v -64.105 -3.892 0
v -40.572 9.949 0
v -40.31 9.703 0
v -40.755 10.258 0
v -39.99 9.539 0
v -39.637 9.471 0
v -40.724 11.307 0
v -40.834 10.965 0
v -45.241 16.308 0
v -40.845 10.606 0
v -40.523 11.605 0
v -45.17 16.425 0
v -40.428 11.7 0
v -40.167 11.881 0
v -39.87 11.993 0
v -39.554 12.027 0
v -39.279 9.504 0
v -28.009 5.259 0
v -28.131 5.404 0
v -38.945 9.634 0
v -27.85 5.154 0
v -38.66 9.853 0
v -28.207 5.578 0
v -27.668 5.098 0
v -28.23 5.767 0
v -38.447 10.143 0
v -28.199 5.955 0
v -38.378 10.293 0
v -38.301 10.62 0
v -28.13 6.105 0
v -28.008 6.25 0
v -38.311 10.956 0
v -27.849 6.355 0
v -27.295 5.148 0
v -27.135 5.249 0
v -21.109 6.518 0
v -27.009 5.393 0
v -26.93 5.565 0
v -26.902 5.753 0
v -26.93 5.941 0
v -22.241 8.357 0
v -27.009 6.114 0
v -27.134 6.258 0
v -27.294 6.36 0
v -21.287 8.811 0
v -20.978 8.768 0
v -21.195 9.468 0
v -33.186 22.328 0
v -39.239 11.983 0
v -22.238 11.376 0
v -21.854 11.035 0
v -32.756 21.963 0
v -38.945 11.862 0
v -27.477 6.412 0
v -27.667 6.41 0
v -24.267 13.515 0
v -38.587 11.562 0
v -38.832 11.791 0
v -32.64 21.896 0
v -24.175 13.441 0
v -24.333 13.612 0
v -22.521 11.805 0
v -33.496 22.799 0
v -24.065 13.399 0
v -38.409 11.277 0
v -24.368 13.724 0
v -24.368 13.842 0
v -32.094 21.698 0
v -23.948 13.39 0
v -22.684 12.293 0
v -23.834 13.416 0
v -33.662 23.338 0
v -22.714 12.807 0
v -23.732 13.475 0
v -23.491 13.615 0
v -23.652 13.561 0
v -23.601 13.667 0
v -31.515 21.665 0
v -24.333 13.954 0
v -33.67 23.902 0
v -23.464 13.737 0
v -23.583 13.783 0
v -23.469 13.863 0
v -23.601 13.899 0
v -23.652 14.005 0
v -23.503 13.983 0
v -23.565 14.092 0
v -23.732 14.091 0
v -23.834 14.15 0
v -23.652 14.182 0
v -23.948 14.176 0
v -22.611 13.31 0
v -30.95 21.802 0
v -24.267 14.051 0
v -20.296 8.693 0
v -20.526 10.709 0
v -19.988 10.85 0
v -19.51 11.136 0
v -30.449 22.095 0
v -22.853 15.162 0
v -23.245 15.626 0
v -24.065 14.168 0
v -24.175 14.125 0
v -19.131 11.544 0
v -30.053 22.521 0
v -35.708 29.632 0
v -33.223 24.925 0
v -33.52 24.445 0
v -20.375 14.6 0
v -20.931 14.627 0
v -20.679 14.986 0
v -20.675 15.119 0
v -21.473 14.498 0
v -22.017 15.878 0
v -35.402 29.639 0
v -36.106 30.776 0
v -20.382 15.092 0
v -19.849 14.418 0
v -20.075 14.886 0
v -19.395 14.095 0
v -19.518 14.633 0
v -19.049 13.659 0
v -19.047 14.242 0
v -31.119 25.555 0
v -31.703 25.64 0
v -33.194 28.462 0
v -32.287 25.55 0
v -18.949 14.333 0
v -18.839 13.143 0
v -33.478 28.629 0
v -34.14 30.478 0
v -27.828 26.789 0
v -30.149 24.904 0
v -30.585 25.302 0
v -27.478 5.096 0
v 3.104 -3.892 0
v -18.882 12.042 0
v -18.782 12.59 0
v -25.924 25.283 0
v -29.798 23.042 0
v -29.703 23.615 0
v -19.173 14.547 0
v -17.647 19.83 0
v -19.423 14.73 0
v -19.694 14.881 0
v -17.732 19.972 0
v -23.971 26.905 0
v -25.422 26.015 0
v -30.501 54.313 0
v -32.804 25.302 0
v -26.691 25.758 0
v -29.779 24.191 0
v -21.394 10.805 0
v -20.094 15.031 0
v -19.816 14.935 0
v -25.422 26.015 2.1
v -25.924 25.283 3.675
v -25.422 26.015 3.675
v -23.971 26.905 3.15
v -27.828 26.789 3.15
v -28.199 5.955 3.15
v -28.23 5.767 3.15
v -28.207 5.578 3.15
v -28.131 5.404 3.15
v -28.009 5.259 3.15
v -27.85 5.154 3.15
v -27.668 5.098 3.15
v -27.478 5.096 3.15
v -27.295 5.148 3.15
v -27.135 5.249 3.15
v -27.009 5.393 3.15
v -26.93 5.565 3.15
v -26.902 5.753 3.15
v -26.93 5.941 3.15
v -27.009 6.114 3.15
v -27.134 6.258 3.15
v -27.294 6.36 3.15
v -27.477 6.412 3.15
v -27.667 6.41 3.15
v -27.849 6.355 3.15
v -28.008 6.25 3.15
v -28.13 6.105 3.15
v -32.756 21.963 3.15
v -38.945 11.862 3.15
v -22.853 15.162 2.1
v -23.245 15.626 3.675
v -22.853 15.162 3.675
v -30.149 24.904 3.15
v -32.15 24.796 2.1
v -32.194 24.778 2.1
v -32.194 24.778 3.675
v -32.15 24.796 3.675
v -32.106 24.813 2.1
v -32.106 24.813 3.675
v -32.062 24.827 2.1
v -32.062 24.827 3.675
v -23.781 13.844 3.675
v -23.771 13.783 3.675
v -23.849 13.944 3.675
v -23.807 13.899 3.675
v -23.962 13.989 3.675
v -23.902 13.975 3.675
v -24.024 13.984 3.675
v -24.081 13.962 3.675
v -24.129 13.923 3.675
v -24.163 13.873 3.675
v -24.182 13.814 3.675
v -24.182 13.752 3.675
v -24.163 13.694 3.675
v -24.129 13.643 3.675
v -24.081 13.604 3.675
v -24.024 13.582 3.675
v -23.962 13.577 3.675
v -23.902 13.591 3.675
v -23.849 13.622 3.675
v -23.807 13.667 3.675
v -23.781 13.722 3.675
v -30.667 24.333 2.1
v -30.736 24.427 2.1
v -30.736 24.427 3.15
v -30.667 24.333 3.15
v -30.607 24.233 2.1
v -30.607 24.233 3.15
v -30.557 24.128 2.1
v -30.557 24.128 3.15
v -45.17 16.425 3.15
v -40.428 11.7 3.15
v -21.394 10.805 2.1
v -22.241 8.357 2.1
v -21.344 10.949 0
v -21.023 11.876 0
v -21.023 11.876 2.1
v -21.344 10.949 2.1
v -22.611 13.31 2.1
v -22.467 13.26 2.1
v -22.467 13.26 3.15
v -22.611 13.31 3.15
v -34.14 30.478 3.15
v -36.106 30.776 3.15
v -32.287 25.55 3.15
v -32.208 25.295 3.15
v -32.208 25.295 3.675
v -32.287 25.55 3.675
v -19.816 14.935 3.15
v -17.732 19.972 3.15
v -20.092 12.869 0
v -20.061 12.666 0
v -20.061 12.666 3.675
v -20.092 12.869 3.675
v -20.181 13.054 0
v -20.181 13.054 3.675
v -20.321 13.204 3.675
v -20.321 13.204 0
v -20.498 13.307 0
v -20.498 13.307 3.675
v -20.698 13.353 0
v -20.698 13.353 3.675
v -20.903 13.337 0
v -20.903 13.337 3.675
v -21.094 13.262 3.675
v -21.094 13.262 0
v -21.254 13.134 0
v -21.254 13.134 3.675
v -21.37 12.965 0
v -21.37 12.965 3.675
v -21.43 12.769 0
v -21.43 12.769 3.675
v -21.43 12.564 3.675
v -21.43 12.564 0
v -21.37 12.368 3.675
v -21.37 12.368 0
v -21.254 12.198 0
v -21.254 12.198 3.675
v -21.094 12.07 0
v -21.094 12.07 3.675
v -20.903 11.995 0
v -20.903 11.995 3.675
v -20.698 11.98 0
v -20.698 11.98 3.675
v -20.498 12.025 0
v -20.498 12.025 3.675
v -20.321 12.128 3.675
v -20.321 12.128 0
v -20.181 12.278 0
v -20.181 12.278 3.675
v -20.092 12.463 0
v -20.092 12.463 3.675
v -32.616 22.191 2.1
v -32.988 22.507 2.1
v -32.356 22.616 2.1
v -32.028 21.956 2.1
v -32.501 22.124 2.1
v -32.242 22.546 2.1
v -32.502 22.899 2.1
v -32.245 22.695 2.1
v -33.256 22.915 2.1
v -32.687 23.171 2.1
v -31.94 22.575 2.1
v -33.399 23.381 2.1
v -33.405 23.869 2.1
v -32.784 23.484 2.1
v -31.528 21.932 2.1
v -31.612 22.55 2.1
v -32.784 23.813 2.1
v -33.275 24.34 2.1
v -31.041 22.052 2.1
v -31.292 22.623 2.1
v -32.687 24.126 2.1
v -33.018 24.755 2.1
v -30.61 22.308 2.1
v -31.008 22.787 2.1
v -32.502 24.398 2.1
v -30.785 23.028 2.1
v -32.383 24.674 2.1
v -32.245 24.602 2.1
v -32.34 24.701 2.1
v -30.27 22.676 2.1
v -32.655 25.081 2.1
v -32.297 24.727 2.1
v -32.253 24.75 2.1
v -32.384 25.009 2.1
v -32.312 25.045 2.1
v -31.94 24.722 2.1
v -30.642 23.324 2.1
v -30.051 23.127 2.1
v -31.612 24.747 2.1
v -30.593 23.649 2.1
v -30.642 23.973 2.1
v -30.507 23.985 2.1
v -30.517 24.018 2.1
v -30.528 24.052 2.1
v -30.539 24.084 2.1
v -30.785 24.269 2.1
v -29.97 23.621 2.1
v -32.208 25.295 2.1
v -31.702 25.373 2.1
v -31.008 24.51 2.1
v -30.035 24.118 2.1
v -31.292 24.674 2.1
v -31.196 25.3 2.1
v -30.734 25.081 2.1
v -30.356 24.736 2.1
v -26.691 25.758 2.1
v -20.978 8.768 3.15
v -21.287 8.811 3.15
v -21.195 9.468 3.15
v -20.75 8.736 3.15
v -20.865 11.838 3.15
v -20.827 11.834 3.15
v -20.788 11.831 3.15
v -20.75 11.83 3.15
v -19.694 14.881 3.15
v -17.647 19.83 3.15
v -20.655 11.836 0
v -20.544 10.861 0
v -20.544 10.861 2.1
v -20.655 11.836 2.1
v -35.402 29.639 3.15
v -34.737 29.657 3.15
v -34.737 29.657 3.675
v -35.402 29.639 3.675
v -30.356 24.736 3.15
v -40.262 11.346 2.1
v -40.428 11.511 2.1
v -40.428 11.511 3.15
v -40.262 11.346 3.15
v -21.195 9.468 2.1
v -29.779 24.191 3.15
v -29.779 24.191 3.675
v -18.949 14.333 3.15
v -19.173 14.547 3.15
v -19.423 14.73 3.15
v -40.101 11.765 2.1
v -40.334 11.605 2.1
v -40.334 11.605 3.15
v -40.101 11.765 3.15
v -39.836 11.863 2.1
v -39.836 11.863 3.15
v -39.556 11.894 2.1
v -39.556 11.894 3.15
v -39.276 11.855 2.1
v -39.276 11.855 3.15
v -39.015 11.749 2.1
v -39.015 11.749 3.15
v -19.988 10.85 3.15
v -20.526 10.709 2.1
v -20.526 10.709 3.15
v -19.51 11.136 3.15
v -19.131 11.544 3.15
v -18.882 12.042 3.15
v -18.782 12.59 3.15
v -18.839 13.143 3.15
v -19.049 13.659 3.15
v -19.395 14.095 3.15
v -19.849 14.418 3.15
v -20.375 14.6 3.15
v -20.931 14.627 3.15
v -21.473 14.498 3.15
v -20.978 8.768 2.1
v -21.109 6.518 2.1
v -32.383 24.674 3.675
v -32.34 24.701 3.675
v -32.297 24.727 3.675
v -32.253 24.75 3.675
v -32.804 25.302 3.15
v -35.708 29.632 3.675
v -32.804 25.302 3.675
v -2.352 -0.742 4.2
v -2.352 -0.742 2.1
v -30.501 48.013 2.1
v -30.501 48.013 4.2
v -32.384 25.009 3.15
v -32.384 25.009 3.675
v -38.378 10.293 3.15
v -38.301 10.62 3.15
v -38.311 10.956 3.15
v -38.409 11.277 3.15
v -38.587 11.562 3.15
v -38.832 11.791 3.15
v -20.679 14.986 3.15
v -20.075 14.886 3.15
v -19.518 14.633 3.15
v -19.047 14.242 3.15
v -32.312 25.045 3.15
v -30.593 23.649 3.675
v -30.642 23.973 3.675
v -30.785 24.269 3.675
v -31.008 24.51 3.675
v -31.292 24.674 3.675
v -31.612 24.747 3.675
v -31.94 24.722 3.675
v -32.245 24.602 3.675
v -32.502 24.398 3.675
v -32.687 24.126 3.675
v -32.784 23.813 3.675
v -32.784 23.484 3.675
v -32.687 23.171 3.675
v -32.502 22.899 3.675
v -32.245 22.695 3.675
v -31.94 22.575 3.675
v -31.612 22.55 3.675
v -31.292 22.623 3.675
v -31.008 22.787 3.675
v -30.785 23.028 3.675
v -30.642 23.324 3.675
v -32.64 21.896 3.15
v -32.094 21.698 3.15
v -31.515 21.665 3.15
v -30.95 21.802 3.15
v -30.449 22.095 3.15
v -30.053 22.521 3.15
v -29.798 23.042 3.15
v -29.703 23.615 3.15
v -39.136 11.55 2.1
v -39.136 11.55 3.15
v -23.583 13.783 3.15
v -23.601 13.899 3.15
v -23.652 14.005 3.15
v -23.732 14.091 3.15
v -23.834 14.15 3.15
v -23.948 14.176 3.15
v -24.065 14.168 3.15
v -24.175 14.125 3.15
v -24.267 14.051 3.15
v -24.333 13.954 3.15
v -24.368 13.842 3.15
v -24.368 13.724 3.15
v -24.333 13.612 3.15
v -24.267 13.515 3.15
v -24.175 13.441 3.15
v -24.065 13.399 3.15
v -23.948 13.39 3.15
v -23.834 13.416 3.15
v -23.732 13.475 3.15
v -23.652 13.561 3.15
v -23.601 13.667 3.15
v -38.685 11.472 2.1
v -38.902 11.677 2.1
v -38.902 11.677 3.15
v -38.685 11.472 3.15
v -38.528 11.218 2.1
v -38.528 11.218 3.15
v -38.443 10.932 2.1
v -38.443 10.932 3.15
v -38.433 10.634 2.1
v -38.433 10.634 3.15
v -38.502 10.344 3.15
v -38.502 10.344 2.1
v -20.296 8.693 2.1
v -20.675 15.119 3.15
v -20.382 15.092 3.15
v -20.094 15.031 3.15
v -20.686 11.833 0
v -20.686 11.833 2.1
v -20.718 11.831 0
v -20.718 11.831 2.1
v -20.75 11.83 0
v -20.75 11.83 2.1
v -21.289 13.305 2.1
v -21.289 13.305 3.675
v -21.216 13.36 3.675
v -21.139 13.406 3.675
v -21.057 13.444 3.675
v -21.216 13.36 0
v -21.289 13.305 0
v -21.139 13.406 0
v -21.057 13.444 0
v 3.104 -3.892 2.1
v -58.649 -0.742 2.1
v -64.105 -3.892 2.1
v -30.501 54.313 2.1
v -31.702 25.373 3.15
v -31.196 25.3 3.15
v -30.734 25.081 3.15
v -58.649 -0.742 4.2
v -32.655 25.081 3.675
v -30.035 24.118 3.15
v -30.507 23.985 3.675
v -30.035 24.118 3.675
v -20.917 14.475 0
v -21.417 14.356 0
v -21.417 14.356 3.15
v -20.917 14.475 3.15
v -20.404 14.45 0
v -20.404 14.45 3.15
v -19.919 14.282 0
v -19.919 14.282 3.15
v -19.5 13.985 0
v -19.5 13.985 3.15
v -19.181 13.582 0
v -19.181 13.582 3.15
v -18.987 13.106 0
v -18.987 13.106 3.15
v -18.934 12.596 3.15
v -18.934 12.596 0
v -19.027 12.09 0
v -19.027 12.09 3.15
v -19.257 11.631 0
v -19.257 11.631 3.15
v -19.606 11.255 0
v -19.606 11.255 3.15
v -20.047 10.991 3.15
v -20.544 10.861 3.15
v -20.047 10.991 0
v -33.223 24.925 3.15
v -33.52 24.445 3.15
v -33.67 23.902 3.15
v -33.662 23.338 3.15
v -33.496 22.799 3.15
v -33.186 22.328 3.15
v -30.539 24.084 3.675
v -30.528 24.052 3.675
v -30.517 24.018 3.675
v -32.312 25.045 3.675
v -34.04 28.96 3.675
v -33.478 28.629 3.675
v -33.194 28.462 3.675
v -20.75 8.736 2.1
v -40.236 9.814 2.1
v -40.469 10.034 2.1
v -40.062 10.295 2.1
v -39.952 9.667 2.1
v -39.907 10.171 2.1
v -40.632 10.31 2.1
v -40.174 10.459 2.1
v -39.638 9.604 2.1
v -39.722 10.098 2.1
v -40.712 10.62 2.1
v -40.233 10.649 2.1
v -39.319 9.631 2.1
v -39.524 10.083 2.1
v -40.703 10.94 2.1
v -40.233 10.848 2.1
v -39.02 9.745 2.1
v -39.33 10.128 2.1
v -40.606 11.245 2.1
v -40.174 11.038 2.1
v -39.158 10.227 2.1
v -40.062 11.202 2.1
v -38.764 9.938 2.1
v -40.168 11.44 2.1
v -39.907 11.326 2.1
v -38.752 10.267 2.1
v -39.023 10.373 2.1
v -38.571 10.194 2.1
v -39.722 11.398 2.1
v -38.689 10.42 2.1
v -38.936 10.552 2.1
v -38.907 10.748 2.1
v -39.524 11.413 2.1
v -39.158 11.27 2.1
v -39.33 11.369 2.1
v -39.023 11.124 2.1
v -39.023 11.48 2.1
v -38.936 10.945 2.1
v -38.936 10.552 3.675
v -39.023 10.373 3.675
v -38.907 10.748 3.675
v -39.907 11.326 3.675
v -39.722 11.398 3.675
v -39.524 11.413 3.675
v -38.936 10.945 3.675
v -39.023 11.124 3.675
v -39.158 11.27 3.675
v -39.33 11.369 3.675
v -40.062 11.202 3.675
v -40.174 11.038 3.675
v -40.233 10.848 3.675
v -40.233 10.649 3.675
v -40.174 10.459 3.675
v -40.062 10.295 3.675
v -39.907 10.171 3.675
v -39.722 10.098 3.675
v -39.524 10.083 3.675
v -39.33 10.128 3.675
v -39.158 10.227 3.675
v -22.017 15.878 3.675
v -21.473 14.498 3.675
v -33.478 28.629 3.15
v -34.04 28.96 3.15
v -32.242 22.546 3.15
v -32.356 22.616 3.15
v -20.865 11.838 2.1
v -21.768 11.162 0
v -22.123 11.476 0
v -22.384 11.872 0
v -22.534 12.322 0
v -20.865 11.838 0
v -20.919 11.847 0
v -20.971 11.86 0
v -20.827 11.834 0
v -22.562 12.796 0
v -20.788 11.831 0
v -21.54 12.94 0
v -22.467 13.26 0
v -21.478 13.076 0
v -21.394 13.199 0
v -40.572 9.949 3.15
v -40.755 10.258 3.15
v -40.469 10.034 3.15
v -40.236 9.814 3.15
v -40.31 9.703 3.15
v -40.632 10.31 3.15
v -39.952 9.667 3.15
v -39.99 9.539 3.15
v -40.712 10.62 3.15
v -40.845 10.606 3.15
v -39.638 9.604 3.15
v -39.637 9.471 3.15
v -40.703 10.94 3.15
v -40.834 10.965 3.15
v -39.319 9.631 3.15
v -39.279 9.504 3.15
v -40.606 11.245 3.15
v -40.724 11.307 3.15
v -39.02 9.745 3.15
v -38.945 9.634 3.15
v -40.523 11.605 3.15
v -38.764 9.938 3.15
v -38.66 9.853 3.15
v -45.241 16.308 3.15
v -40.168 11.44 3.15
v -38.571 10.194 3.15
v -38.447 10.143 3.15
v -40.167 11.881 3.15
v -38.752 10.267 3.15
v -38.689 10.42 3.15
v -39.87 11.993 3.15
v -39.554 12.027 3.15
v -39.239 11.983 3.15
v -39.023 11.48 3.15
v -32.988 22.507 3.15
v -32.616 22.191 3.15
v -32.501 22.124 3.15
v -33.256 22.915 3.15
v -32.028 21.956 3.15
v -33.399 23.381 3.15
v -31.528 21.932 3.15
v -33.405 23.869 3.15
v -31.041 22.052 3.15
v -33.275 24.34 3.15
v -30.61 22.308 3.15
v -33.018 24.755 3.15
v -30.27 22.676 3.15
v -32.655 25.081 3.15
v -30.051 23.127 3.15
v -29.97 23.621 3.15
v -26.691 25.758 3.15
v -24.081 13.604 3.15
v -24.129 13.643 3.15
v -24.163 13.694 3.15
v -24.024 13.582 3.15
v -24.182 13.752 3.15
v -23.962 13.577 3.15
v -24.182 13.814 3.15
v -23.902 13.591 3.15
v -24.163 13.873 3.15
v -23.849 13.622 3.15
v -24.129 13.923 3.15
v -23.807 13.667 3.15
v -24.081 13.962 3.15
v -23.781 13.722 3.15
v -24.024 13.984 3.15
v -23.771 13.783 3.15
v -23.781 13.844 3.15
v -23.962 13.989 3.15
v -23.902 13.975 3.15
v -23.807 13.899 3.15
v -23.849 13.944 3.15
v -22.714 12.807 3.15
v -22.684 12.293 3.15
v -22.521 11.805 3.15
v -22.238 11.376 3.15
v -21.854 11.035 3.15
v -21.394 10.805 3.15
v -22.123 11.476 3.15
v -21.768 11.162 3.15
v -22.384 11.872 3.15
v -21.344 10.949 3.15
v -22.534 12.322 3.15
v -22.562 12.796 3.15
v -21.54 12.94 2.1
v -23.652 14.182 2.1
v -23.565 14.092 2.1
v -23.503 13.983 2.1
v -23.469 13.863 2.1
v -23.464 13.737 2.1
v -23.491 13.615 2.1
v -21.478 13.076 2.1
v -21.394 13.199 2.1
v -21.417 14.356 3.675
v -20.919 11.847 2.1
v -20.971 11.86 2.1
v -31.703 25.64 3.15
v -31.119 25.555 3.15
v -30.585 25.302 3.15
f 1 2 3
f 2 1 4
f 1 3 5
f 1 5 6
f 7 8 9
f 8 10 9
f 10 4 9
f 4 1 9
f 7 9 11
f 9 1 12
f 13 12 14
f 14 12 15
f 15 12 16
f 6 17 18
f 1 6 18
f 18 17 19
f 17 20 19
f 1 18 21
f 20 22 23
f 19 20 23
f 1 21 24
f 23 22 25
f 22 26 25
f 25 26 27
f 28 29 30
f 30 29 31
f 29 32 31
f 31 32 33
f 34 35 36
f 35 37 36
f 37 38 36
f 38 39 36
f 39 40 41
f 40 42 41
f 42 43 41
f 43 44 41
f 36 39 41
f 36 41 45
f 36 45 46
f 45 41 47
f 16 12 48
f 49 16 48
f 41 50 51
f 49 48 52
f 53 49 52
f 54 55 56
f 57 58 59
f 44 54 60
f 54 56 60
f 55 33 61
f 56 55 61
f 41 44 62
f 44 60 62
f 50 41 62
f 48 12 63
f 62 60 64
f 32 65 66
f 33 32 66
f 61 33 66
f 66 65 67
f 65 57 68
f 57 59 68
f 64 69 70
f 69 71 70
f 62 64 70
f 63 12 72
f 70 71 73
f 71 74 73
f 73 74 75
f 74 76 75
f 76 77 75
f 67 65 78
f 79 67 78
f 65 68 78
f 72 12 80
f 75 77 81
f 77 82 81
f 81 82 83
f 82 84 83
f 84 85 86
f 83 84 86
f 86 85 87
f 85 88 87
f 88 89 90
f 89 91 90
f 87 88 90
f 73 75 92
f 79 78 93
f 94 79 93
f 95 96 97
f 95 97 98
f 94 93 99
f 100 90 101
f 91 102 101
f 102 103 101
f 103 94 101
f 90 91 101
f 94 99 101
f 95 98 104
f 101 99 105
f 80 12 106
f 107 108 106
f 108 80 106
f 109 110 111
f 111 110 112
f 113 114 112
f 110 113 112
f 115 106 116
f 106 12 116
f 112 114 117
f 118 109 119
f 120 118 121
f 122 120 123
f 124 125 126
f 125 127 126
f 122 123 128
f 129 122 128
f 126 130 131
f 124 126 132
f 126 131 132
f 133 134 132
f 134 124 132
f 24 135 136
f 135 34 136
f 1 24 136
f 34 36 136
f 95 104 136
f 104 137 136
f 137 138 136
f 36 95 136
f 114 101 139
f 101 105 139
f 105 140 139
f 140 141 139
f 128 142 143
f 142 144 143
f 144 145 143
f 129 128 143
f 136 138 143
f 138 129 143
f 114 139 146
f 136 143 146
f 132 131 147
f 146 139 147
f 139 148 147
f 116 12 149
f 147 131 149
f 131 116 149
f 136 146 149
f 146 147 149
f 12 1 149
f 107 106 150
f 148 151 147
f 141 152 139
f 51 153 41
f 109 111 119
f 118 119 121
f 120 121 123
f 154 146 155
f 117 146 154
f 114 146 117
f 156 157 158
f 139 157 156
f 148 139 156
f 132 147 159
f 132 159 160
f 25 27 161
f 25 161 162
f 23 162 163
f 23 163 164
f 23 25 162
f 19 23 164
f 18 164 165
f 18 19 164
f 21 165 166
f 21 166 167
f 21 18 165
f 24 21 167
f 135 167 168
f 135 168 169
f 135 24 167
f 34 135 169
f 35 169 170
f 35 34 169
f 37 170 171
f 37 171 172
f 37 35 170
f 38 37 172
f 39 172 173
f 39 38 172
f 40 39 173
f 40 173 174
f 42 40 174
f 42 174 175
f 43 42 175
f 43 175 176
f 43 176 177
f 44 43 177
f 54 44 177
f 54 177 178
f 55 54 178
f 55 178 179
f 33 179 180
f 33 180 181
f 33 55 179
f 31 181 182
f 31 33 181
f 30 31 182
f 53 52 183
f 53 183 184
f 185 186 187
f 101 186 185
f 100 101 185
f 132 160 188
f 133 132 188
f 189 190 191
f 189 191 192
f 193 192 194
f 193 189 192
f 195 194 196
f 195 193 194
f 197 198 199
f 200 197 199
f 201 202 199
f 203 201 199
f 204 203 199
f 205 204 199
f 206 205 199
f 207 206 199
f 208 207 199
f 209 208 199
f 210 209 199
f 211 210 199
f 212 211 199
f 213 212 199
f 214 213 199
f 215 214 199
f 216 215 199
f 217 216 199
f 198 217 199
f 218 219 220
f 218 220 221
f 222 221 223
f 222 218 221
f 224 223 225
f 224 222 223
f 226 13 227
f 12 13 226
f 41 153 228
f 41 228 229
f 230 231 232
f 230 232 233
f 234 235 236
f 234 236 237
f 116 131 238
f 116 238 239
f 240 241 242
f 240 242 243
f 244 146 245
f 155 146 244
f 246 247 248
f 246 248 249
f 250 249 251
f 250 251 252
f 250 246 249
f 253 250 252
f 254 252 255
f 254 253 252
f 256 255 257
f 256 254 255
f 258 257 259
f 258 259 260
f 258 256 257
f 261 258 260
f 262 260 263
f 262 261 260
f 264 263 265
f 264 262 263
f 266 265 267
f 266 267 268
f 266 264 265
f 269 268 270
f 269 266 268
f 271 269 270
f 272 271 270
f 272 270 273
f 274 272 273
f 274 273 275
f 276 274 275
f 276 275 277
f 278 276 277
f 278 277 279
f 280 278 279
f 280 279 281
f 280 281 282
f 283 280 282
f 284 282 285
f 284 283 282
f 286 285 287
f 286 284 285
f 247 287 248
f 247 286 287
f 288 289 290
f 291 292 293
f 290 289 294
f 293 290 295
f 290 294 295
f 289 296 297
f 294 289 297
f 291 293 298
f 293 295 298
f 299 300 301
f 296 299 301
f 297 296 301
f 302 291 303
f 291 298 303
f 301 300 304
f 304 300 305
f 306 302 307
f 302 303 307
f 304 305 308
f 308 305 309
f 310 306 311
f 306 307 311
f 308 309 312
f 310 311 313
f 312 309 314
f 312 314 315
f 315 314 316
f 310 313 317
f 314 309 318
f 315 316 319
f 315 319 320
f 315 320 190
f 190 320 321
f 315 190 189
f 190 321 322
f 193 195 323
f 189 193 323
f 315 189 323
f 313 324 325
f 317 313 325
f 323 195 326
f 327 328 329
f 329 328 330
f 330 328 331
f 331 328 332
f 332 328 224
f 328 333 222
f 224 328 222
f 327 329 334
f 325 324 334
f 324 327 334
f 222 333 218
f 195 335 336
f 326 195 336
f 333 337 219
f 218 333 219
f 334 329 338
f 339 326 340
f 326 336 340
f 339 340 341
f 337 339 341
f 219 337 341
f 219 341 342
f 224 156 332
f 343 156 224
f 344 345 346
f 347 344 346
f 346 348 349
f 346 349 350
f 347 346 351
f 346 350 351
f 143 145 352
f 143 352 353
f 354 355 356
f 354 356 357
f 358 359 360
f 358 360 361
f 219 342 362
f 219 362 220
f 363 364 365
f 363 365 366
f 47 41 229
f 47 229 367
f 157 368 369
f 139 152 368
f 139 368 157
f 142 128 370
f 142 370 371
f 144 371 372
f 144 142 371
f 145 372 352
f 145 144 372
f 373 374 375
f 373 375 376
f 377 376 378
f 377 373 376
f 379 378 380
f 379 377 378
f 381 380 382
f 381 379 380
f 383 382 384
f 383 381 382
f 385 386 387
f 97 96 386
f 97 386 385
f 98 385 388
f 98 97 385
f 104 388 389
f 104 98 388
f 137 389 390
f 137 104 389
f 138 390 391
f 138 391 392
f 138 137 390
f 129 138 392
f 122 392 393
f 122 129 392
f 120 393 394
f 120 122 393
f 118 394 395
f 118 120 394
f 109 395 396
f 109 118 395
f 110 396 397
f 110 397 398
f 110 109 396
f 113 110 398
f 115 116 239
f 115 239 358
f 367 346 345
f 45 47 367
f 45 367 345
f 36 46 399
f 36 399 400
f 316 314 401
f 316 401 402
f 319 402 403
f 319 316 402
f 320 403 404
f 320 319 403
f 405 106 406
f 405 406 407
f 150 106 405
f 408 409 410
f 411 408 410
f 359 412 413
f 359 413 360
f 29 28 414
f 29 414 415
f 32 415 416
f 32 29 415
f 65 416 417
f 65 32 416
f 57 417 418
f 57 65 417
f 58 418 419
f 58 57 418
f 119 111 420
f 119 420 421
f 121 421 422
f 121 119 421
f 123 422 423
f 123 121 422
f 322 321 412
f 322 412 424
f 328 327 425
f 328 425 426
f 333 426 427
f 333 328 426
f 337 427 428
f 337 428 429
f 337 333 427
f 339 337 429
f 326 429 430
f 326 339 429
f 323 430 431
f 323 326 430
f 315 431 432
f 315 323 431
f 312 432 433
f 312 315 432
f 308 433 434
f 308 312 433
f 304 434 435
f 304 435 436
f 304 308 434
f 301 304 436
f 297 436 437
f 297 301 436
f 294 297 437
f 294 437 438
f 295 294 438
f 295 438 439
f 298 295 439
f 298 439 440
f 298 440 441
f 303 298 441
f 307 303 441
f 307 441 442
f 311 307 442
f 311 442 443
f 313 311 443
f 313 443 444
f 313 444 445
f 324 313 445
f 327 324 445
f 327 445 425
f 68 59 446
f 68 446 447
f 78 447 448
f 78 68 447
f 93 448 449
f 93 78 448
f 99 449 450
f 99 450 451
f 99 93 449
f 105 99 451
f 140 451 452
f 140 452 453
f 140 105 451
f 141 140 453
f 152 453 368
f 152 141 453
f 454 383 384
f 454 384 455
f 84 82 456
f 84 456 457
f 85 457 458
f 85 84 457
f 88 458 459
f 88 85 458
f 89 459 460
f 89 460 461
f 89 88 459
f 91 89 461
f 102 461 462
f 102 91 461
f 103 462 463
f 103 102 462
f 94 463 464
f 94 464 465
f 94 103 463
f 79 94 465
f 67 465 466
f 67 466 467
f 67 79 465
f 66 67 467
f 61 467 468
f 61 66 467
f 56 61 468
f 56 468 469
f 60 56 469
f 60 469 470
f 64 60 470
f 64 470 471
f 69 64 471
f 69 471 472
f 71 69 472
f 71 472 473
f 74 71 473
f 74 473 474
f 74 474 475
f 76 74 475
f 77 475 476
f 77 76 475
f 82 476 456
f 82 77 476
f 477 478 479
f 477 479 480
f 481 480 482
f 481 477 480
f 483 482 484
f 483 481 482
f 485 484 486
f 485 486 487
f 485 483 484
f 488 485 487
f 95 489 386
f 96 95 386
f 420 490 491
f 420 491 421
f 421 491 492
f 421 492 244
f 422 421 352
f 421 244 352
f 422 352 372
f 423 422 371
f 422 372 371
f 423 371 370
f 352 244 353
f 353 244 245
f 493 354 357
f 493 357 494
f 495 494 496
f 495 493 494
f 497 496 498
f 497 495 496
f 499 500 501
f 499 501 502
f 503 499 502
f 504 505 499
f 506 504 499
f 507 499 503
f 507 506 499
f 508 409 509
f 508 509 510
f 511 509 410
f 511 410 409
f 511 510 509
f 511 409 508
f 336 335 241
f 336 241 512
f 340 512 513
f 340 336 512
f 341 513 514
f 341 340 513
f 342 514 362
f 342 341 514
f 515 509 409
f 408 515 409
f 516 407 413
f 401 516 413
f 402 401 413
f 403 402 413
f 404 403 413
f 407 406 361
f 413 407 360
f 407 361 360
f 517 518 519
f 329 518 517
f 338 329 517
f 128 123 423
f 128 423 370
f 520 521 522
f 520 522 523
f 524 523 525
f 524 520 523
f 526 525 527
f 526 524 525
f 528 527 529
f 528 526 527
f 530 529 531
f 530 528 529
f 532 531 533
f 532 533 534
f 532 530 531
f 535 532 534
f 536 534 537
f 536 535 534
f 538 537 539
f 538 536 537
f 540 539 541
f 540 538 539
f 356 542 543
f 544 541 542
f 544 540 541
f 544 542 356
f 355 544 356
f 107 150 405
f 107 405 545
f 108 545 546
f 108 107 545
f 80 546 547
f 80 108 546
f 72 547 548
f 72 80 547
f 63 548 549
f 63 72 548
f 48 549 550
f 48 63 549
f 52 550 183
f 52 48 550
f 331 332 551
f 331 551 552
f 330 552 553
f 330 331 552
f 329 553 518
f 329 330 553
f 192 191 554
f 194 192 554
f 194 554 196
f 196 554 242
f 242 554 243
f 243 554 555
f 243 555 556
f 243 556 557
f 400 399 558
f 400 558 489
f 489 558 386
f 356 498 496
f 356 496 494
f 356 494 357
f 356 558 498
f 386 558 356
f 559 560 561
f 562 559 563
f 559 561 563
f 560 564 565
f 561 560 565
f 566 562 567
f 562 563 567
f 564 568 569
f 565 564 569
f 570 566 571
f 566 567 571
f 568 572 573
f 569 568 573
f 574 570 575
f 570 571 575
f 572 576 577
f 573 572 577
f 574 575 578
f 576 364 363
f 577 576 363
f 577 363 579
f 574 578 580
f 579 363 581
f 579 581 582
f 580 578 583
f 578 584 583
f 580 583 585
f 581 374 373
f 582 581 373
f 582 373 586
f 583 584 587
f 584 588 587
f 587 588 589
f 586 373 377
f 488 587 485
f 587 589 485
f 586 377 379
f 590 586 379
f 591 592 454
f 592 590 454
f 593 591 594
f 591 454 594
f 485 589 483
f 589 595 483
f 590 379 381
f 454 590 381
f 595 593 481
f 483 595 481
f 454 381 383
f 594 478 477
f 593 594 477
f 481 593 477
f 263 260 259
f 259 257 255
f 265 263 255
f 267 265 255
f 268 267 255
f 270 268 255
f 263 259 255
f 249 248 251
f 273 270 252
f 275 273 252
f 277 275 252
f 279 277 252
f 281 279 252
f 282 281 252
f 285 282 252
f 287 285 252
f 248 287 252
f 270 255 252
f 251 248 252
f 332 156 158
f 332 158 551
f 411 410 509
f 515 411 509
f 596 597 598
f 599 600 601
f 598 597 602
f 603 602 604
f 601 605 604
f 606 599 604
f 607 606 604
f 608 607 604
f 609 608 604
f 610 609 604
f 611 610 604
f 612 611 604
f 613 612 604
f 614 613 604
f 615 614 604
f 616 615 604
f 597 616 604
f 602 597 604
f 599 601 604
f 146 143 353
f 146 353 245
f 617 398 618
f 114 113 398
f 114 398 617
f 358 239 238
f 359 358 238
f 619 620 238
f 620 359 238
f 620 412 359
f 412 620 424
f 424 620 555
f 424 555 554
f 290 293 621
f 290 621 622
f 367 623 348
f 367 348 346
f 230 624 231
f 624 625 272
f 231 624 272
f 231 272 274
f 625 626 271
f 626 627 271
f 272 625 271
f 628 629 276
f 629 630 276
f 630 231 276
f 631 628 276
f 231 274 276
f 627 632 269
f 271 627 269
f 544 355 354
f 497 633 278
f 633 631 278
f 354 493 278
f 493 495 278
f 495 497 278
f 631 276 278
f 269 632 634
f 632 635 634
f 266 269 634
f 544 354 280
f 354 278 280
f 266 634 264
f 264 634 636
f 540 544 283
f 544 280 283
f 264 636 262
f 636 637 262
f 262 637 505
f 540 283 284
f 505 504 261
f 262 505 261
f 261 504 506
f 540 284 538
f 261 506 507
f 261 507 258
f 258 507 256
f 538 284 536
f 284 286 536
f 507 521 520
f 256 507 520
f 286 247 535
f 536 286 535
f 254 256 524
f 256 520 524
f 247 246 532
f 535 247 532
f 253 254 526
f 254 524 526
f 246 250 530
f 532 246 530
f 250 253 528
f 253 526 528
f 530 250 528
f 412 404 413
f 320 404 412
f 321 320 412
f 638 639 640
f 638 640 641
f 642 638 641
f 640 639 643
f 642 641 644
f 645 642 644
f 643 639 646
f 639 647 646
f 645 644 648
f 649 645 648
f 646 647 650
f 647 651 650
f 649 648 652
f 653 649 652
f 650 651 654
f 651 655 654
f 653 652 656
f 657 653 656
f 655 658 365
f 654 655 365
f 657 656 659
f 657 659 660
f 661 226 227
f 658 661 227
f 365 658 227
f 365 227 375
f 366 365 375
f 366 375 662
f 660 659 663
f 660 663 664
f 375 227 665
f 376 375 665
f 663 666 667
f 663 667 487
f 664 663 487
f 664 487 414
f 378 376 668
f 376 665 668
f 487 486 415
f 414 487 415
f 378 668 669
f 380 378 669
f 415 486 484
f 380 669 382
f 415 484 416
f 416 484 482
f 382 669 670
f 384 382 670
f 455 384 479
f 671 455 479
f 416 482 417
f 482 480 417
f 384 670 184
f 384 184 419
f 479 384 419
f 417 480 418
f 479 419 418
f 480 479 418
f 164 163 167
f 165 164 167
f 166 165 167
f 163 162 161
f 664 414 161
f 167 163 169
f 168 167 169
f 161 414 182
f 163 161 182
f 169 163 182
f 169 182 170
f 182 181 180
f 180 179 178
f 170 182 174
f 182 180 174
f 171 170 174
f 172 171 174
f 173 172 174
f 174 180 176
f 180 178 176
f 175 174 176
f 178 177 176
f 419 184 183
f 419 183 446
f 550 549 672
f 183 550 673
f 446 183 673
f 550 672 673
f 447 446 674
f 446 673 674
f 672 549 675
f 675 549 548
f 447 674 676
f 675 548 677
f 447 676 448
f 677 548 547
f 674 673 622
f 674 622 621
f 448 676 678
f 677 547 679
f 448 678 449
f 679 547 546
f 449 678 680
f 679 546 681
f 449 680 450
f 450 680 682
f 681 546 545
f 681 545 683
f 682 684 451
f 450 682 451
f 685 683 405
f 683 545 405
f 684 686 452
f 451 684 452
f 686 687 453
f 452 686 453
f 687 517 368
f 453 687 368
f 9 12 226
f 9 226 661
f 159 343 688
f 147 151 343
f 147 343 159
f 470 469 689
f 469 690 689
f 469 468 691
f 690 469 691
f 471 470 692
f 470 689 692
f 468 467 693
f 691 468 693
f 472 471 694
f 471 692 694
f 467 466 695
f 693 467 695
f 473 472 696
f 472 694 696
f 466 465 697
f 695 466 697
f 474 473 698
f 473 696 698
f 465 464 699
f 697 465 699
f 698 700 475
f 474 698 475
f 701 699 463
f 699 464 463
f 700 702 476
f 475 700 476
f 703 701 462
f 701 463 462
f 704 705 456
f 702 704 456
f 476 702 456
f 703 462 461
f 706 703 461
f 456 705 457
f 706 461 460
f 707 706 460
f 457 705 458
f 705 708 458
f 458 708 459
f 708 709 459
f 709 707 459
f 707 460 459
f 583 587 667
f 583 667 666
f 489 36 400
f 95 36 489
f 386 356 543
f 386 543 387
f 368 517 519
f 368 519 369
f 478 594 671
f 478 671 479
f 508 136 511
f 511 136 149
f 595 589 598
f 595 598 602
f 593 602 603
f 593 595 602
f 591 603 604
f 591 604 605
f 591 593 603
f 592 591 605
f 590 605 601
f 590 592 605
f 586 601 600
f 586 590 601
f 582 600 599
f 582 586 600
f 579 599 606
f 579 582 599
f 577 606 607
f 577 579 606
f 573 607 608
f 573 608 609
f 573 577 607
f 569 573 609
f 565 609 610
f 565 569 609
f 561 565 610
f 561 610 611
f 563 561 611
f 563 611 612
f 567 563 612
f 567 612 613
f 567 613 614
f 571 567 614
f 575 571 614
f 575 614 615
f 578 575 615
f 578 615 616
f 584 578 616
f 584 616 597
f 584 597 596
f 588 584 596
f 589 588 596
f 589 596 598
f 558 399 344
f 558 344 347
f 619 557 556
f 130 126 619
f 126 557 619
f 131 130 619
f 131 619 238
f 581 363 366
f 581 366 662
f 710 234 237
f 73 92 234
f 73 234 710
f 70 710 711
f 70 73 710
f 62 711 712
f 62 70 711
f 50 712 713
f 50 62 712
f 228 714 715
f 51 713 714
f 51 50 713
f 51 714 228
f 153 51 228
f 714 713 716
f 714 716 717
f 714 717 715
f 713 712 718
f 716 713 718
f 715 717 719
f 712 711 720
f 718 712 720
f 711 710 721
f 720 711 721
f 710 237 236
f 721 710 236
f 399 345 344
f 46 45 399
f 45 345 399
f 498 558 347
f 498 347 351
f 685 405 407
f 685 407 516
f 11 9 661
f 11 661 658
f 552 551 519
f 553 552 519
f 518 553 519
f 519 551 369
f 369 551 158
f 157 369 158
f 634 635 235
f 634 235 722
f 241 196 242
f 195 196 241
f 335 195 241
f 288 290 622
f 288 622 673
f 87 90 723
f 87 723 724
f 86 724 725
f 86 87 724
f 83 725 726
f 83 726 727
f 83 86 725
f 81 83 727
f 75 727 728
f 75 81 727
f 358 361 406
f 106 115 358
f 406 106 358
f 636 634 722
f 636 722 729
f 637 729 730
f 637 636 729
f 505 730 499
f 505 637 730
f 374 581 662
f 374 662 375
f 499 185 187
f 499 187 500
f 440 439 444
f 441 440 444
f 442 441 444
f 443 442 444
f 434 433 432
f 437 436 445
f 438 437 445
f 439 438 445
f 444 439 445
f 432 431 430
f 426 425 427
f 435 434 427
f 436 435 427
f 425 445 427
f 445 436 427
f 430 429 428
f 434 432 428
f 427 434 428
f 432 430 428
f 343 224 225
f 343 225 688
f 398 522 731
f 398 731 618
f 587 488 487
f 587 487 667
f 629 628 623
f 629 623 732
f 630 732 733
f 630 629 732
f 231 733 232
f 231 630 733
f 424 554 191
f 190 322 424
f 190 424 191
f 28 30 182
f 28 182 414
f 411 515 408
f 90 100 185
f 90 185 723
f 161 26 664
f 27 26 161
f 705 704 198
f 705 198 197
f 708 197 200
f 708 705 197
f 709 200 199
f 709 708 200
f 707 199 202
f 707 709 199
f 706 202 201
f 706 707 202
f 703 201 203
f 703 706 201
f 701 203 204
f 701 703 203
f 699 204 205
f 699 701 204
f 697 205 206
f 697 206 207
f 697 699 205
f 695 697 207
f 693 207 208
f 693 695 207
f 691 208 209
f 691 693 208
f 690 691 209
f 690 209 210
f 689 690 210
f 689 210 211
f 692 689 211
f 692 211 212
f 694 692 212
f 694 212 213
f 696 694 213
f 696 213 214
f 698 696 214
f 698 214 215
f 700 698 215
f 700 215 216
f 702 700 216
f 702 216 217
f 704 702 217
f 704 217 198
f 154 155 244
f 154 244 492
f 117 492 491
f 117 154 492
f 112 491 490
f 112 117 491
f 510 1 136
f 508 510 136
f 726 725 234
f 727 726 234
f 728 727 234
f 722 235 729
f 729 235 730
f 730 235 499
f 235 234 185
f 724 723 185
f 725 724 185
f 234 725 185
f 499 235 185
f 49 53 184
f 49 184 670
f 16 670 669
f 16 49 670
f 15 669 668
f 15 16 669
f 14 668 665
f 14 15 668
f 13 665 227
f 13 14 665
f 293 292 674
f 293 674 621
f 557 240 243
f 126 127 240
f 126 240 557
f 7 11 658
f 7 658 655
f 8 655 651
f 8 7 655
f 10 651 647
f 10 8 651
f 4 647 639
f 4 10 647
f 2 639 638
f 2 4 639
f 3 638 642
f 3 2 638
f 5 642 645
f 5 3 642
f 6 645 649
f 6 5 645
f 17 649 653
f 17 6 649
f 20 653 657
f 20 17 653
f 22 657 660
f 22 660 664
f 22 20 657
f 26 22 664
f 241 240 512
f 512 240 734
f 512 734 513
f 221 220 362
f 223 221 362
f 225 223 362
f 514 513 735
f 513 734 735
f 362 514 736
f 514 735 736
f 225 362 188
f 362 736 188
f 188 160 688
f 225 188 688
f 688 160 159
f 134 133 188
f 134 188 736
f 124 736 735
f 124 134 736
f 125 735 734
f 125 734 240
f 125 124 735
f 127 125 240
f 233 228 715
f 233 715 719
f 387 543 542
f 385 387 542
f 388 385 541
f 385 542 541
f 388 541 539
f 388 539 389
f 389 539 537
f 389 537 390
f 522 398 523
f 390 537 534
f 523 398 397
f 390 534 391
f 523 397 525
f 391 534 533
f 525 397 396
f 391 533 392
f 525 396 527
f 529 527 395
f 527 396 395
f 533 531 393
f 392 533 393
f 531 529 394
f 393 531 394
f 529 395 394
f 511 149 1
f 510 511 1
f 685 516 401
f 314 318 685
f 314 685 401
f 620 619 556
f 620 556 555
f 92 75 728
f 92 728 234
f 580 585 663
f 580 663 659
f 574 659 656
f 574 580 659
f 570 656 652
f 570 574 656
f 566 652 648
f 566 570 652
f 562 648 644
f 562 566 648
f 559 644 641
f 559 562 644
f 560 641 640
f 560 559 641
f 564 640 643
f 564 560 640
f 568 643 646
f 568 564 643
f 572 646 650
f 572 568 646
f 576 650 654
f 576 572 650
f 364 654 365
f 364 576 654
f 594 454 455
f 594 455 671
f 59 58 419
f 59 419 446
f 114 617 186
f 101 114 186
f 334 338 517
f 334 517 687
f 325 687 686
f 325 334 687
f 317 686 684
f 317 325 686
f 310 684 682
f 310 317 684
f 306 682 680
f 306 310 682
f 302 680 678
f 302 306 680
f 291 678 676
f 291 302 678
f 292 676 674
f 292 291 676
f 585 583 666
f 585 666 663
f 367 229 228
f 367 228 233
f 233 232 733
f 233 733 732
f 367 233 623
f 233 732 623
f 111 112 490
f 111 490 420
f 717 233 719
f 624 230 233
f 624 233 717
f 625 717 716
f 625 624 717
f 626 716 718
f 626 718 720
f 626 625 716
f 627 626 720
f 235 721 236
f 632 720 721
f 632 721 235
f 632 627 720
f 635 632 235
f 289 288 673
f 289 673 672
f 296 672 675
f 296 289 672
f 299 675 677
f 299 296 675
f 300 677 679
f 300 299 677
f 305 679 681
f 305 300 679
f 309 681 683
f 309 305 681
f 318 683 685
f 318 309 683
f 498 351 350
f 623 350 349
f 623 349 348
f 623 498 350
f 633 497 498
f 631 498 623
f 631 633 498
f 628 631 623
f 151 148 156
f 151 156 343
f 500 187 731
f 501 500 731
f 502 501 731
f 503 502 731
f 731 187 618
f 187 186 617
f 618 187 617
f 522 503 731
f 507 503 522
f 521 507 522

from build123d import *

# Parameters (mm, degrees)
F1_DEPTH = 4
F2_DEPTH = 4
F3_R     = 0.3756576168
F3_R_2   = 0.1964100376
F4_DEPTH = 3
F3_R_3   = 0.635
F3_R_4   = 1.048986259
F5_DEPTH = 2
F3_R_5   = 0.6555251964
F6_DEPTH = 3.5
F7_DEPTH = 2
F8_SCALE = 1.05


with BuildPart() as f1:
    # F0 (on Top) → F1 (new body)
    with BuildSketch(Plane.XY):
        Polygon((-58.909031195, -0.8922100489), (-5.2926484686, -0.8922100489), (-32.1008398318, 45.5409394512), align=None)
        Polygon((-53.8927929356, 1.9193515182), (-32.0291238777, 39.7883371663), (-10.1654548198, 1.9193515182), align=None, mode=Mode.SUBTRACT)
    extrude(amount=F1_DEPTH)

    # F0 (on Top) → F2 (join)
    with BuildSketch(Plane.XY):
        Polygon((-10.1654548198, 1.9193515182), (-32.0291238777, 39.7883371663), (-53.8927929356, 1.9193515182), align=None)
    extrude(amount=F2_DEPTH)

    # F3 (on Top) → F4 (cut)
    with BuildSketch(Plane.XY):
        with BuildLine():
            Line((-32.1544126805, 22.79387742), (-28.472637414, 24.3459273728))
            Line((-28.472637414, 24.3459273728), (-25.8817355115, 25.4381203734))
            Line((-25.8817355115, 25.4381203734), (-29.5555517077, 25.3282375634))
            Line((-29.5555517077, 25.3282375634), (-31.7658662192, 23.532875228))
            Line((-31.7658662192, 23.532875228), (-31.9630217953, 23.3727325453))
            Line((-31.9630217953, 23.3727325453), (-32.3252464874, 23.0785099061))
            ThreePointArc((-32.3252464874, 23.0785099061), (-32.2297356146, 22.9422519708), (-32.1544126805, 22.79387742))
        make_face()
        with BuildLine():
            Line((-34.0057883513, 20.8848746316), (-34.1387262546, 20.6679213456))
            ThreePointArc((-34.1387262546, 20.6679213456), (-32.0514246745, 20.8574778507), (-31.4131536576, 22.853816916))
            Line((-31.4131536576, 22.853816916), (-31.6575446537, 22.7846140185))
            ThreePointArc((-31.6575446537, 22.7846140185), (-32.2048998604, 21.0600060492), (-34.0057883513, 20.8848746316))
        make_face()
        with BuildLine():
            ThreePointArc((-34.2945511212, 23.9122157523), (-35.1344997917, 22.3095710749), (-34.2484357054, 20.7319544656))
            Line((-34.2484357054, 20.7319544656), (-34.1157180625, 20.9485482888))
            ThreePointArc((-34.1157180625, 20.9485482888), (-34.8805480058, 22.314786884), (-34.1530641128, 23.7012716212))
            Line((-34.1530641128, 23.7012716212), (-34.2945511212, 23.9122157523))
        make_face()
        with BuildLine():
            ThreePointArc((-33.7266721424, 23.9053636573), (-32.7631473798, 23.9095721193), (-31.9630217953, 23.3727325453))
            Line((-31.9630217953, 23.3727325453), (-31.7658662192, 23.532875228))
            ThreePointArc((-31.7658662192, 23.532875228), (-32.6897138861, 24.1527254084), (-33.8022268728, 24.147866199))
            Line((-33.8022268728, 24.147866199), (-33.7266721424, 23.9053636573))
        make_face()
        Polygon((-37.439212203, 29.1254520416), (-36.7691402524, 28.0427267223), (-36.1357294023, 28.0589684844), (-33.8941096292, 23.6325567007), (-33.8255574097, 23.6672728586), (-34.6282780244, 25.484751086), (-35.4721397161, 27.3953787982), (-34.9364497739, 27.0802669947), (-35.5669371784, 28.8410577923), align=None)
        Polygon((-40.1023184333, 10.9354004686), (-40.0357920725, 11.0439708027), (-34.1387262546, 20.6679213456), (-34.0057883513, 20.8848746316), (-33.7592028081, 21.2872996926), (-33.8674906086, 21.3536529312), (-34.1157180625, 20.9485482888), (-34.2484357054, 20.7319544656), (-40.1430096601, 11.1120706175), (-40.2094110163, 11.0037042896), (-40.3252987546, 10.814576697), (-40.2170109542, 10.7482234584), align=None)
        with BuildLine():
            Line((-21.8085683814, 13.9872856063), (-19.8589176688, 18.7007068296))
            Line((-19.8589176688, 18.7007068296), (-19.9405216036, 18.8356845341))
            Line((-19.9405216036, 18.8356845341), (-21.924688319, 14.0388183843))
            ThreePointArc((-21.924688319, 14.0388183843), (-22.3258071802, 14.163131996), (-22.7426976389, 14.2136548644))
            Line((-22.7426976389, 14.2136548644), (-22.7465879873, 14.0867144643))
            ThreePointArc((-22.7465879873, 14.0867144643), (-21.8982425542, 13.8889683334), (-21.1922032459, 13.3787703315))
            Line((-21.1922032459, 13.3787703315), (-21.098991902, 13.4650295072))
            ThreePointArc((-21.098991902, 13.4650295072), (-21.4289470838, 13.75989762), (-21.8085683814, 13.9872856063))
        make_face()
        with BuildLine():
            Line((-23.5027573383, 13.6224841241), (-23.449371184, 13.4871852627))
            ThreePointArc((-23.449371184, 13.4871852627), (-21.1355854297, 12.2969895142), (-22.6179189393, 10.1585653741))
            Line((-22.6179189393, 10.1585653741), (-22.6014117467, 10.014054558))
            ThreePointArc((-22.6014117467, 10.014054558), (-20.9944706596, 12.3322384151), (-23.5027573383, 13.6224841241))
        make_face()
        with BuildLine():
            Line((-24.4494511051, 12.4434589257), (-24.5869057472, 12.4910203045))
            ThreePointArc((-24.5869057472, 12.4910203045), (-24.5014237549, 11.0579440906), (-23.4276409497, 10.1050510783))
            Line((-23.4276409497, 10.1050510783), (-23.3800795709, 10.2425057204))
            ThreePointArc((-23.3800795709, 10.2425057204), (-24.3705976719, 11.1215082267), (-24.4494511051, 12.4434589257))
        make_face()
        with BuildLine():
            Line((-22.9241548234, 11.089149363), (-23.23867048, 8.8318424018))
            Line((-23.23867048, 8.8318424018), (-23.3258662152, 8.2060308217))
            Line((-23.3258662152, 8.2060308217), (-23.0312290048, 8.1649783564))
            Line((-23.0312290048, 8.1649783564), (-22.8142887354, 8.1347515807))
            Line((-22.8142887354, 8.1347515807), (-22.8142887354, 11.0815322095))
            ThreePointArc((-22.8142887354, 11.0815322095), (-22.8693536478, 11.0834387808), (-22.9241548234, 11.089149363))
        make_face()
        with Locations((-25.8885102101, 12.9413950747)):
            Circle(F3_R)
        with Locations((-25.8885102101, 12.9413950747)):
            Circle(F3_R_2, mode=Mode.SUBTRACT)
        with BuildLine():
            Line((-39.7208541944, 9.6656456843), (-39.6032555968, 9.6175831845))
            ThreePointArc((-39.6032555968, 9.6175831845), (-39.5758973979, 10.4046540513), (-40.0357920725, 11.0439708027))
            Line((-40.0357920725, 11.0439708027), (-40.1023184333, 10.9354004686))
            ThreePointArc((-40.1023184333, 10.9354004686), (-39.6966188641, 10.3651043607), (-39.7208541944, 9.6656456843))
        make_face()
        with BuildLine():
            Line((-39.6686708723, 9.4744095773), (-29.9092287895, 5.4857295025))
            ThreePointArc((-29.9092287895, 5.4857295025), (-28.732106837, 5.029867848), (-29.8433309183, 5.6287058731))
            Line((-29.8433309183, 5.6287058731), (-39.6032555968, 9.6175831845))
            Line((-39.6032555968, 9.6175831845), (-39.7208541944, 9.6656456843))
            Line((-39.7208541944, 9.6656456843), (-39.8995765777, 9.7386894509))
            Line((-39.8995765777, 9.7386894509), (-39.9590791965, 9.5930993432))
            Line((-39.9590791965, 9.5930993432), (-39.786962426, 9.5227552879))
            Line((-39.786962426, 9.5227552879), (-39.6686708723, 9.4744095773))
        make_face()
        Polygon((-46.1389445683, 15.3457269633), (-41.6457996173, 10.8674371808), (-41.5557258141, 10.7776611783), (-41.3976554127, 10.6201133869), (-41.3080016721, 10.7100645225), (-41.4657952315, 10.8673363872), (-41.555897981, 10.9571412404), (-46.0714399815, 15.4577540234), align=None)
        with BuildLine():
            ThreePointArc((-40.1430096601, 11.1120706175), (-40.8743929691, 11.2620400817), (-41.555897981, 10.9571412404))
            Line((-41.555897981, 10.9571412404), (-41.4657952315, 10.8673363872))
            ThreePointArc((-41.4657952315, 10.8673363872), (-40.8593552693, 11.1359271179), (-40.2094110163, 11.0037042896))
            Line((-40.2094110163, 11.0037042896), (-40.1430096601, 11.1120706175))
        make_face()
        with BuildLine():
            ThreePointArc((-41.6457996173, 10.8674371808), (-41.4432213106, 9.0553707225), (-39.6686708723, 9.4744095773))
            Line((-39.6686708723, 9.4744095773), (-39.786962426, 9.5227552879))
            ThreePointArc((-39.786962426, 9.5227552879), (-41.3729906341, 9.1612522684), (-41.5557258141, 10.7776611783))
            Line((-41.5557258141, 10.7776611783), (-41.6457996173, 10.8674371808))
        make_face()
    extrude(amount=F4_DEPTH, mode=Mode.SUBTRACT)

    # F3 (on Top) → F5 (cut)
    with BuildSketch(Plane.XY):
        with BuildLine():
            Line((-23.3800795709, 10.2425057204), (-23.4276409497, 10.1050510783))
            Line((-23.4276409497, 10.1050510783), (-24.2343964016, 7.7734895301))
            Line((-24.2343964016, 7.7734895301), (-23.23867048, 8.8318424018))
            Line((-23.23867048, 8.8318424018), (-22.9241548234, 11.089149363))
            ThreePointArc((-22.9241548234, 11.089149363), (-23.0002677721, 11.1035594813), (-23.074619957, 11.1252985032))
            Line((-23.074619957, 11.1252985032), (-23.3800795709, 10.2425057204))
        make_face()
        with BuildLine():
            ThreePointArc((-22.7239352236, 11.0866759389), (-22.769038832, 11.0828191821), (-22.8142887354, 11.0815322095))
            Line((-22.8142887354, 11.0815322095), (-22.8142887354, 8.1347515807))
            Line((-22.8142887354, 8.1347515807), (-23.0312290048, 8.1649783564))
            Line((-23.0312290048, 8.1649783564), (-23.1564361602, 6.0221981257))
            Line((-23.1564361602, 6.0221981257), (-22.3820121472, 8.0933393826))
            Line((-22.3820121472, 8.0933393826), (-22.6014117467, 10.014054558))
            Line((-22.6014117467, 10.014054558), (-22.6179189393, 10.1585653741))
            Line((-22.6179189393, 10.1585653741), (-22.7239352236, 11.0866759389))
        make_face()
        with BuildLine():
            Line((-25.4247522826, 12.7809278391), (-24.5869057472, 12.4910203045))
            Line((-24.5869057472, 12.4910203045), (-24.4494511051, 12.4434589257))
            Line((-24.4494511051, 12.4434589257), (-23.5666583224, 12.1379993118))
            ThreePointArc((-23.5666583224, 12.1379993118), (-23.4705773692, 12.3283537562), (-23.3274192063, 12.4863794012))
            Line((-23.3274192063, 12.4863794012), (-24.8178424468, 14.254423858))
            Line((-24.8178424468, 14.254423858), (-25.5783880562, 13.3217178307))
            ThreePointArc((-25.5783880562, 13.3217178307), (-25.4164550768, 13.0755036136), (-25.4247522826, 12.7809278391))
        make_face()
        with BuildLine():
            ThreePointArc((-41.5557258141, 10.7776611783), (-41.3729906341, 9.1612522684), (-39.786962426, 9.5227552879))
            Line((-39.786962426, 9.5227552879), (-39.9590791965, 9.5930993432))
            Line((-39.9590791965, 9.5930993432), (-39.8995765777, 9.7386894509))
            Line((-39.8995765777, 9.7386894509), (-39.7208541944, 9.6656456843))
            ThreePointArc((-39.7208541944, 9.6656456843), (-39.6966188641, 10.3651043607), (-40.1023184333, 10.9354004686))
            Line((-40.1023184333, 10.9354004686), (-40.2170109542, 10.7482234584))
            Line((-40.2170109542, 10.7482234584), (-40.3252987546, 10.814576697))
            Line((-40.3252987546, 10.814576697), (-40.2094110163, 11.0037042896))
            ThreePointArc((-40.2094110163, 11.0037042896), (-40.8593552693, 11.1359271179), (-41.4657952315, 10.8673363872))
            Line((-41.4657952315, 10.8673363872), (-41.3080016721, 10.7100645225))
            Line((-41.3080016721, 10.7100645225), (-41.3976554127, 10.6201133869))
            Line((-41.3976554127, 10.6201133869), (-41.5557258141, 10.7776611783))
        make_face()
        with Locations((-40.7416149974, 10.0511629134)):
            Circle(F3_R_3, mode=Mode.SUBTRACT)
        with BuildLine():
            Line((-33.7592028081, 21.2872996926), (-34.0057883513, 20.8848746316))
            ThreePointArc((-34.0057883513, 20.8848746316), (-32.2048998604, 21.0600060492), (-31.6575446537, 22.7846140185))
            Line((-31.6575446537, 22.7846140185), (-32.1065527673, 22.657470781))
            ThreePointArc((-32.1065527673, 22.657470781), (-32.1211502555, 22.7051429275), (-32.1377552743, 22.7521534961))
            Line((-32.1377552743, 22.7521534961), (-27.2637233138, 24.5908666402))
            Line((-27.2637233138, 24.5908666402), (-28.472637414, 24.3459273728))
            Line((-28.472637414, 24.3459273728), (-32.1544126805, 22.79387742))
            ThreePointArc((-32.1544126805, 22.79387742), (-32.2297356146, 22.9422519708), (-32.3252464874, 23.0785099061))
            Line((-32.3252464874, 23.0785099061), (-31.9630217953, 23.3727325453))
            ThreePointArc((-31.9630217953, 23.3727325453), (-32.7631473798, 23.9095721193), (-33.7266721424, 23.9053636573))
            Line((-33.7266721424, 23.9053636573), (-33.5878589801, 23.4598251125))
            ThreePointArc((-33.5878589801, 23.4598251125), (-33.6511828612, 23.4380998169), (-33.7131678459, 23.4128062592))
            Line((-33.7131678459, 23.4128062592), (-33.8255574097, 23.6672728586))
            Line((-33.8255574097, 23.6672728586), (-33.8941096292, 23.6325567007))
            Line((-33.8941096292, 23.6325567007), (-33.7693483742, 23.3861970389))
            ThreePointArc((-33.7693483742, 23.3861970389), (-33.832338615, 23.3518441558), (-33.8931166689, 23.3137138638))
            Line((-33.8931166689, 23.3137138638), (-34.1530641128, 23.7012716212))
            ThreePointArc((-34.1530641128, 23.7012716212), (-34.8805480058, 22.314786884), (-34.1157180625, 20.9485482888))
            Line((-34.1157180625, 20.9485482888), (-33.8674906086, 21.3536529312))
            Line((-33.8674906086, 21.3536529312), (-33.7592028081, 21.2872996926))
        make_face()
        with Locations((-33.2380506147, 22.3370705583)):
            Circle(F3_R_4, mode=Mode.SUBTRACT)
    extrude(amount=F5_DEPTH, mode=Mode.SUBTRACT)

    # F3 (on Top) → F6 (cut)
    with BuildSketch(Plane.XY):
        with Locations((-25.8885102101, 12.9413950747)):
            Circle(F3_R_2)
        with Locations((-22.8142887354, 11.8776680902)):
            Circle(F3_R_5)
        with BuildLine():
            Line((-24.8178424468, 14.254423858), (-23.3274192063, 12.4863794012))
            ThreePointArc((-23.3274192063, 12.4863794012), (-23.2223223597, 12.5612914528), (-23.106502358, 12.6182378298))
            Line((-23.106502358, 12.6182378298), (-23.449371184, 13.4871852627))
            Line((-23.449371184, 13.4871852627), (-23.5027573383, 13.6224841241))
            Line((-23.5027573383, 13.6224841241), (-24.0212455392, 14.9365114048))
            Line((-24.0212455392, 14.9365114048), (-25.1908730716, 14.696938917))
            Line((-25.1908730716, 14.696938917), (-24.8178424468, 14.254423858))
        make_face()
        with BuildLine():
            Line((-33.5878589801, 23.4598251125), (-33.7266721424, 23.9053636573))
            Line((-33.7266721424, 23.9053636573), (-33.8022268728, 24.147866199))
            Line((-33.8022268728, 24.147866199), (-34.666351974, 26.9213858992))
            Line((-34.666351974, 26.9213858992), (-34.9364497739, 27.0802669947))
            Line((-34.9364497739, 27.0802669947), (-35.4721397161, 27.3953787982))
            Line((-35.4721397161, 27.3953787982), (-34.6282780244, 25.484751086))
            Line((-34.6282780244, 25.484751086), (-33.8255574097, 23.6672728586))
            Line((-33.8255574097, 23.6672728586), (-33.7131678459, 23.4128062592))
            ThreePointArc((-33.7131678459, 23.4128062592), (-33.6511828612, 23.4380998169), (-33.5878589801, 23.4598251125))
        make_face()
        with BuildLine():
            Line((-31.6575446537, 22.7846140185), (-31.4131536576, 22.853816916))
            Line((-31.4131536576, 22.853816916), (-27.7420189232, 23.893352598))
            Line((-27.7420189232, 23.893352598), (-27.2637233138, 24.5908666402))
            Line((-27.2637233138, 24.5908666402), (-32.1377552743, 22.7521534961))
            ThreePointArc((-32.1377552743, 22.7521534961), (-32.1211502555, 22.7051429275), (-32.1065527673, 22.657470781))
            Line((-32.1065527673, 22.657470781), (-31.6575446537, 22.7846140185))
        make_face()
        with Locations((-33.2380506147, 22.3370705583)):
            Circle(F3_R_4)
        with BuildLine():
            Line((-37.0600149035, 28.0352681875), (-34.2945511212, 23.9122157523))
            Line((-34.2945511212, 23.9122157523), (-34.1530641128, 23.7012716212))
            Line((-34.1530641128, 23.7012716212), (-33.8931166689, 23.3137138638))
            ThreePointArc((-33.8931166689, 23.3137138638), (-33.832338615, 23.3518441558), (-33.7693483742, 23.3861970389))
            Line((-33.7693483742, 23.3861970389), (-33.8941096292, 23.6325567007))
            Line((-33.8941096292, 23.6325567007), (-36.1357294023, 28.0589684844))
            Line((-36.1357294023, 28.0589684844), (-36.7691402524, 28.0427267223))
            Line((-36.7691402524, 28.0427267223), (-37.0600149035, 28.0352681875))
        make_face()
        with Locations((-40.7416149974, 10.0511629134)):
            Circle(F3_R_3)
    extrude(amount=F6_DEPTH, mode=Mode.SUBTRACT)

    # F0 (on Top) → F7 (join)
    with BuildSketch(Plane.XY):
        Polygon((-64.1051836177, -3.8922100489), (-0.0964960459, -3.8922100489), (-32.1008398318, 51.5409394512), align=None)
        Polygon((-32.1008398318, 45.5409394512), (-5.2926484686, -0.8922100489), (-58.909031195, -0.8922100489), align=None, mode=Mode.SUBTRACT)
    extrude(amount=F7_DEPTH)


with BuildPart() as f1_1:
    # F8: moved
    add(f1.part.scale(F8_SCALE).moved(Location((3.2052591809, 0.1946105024, 0))))


solid = f1_1.part
